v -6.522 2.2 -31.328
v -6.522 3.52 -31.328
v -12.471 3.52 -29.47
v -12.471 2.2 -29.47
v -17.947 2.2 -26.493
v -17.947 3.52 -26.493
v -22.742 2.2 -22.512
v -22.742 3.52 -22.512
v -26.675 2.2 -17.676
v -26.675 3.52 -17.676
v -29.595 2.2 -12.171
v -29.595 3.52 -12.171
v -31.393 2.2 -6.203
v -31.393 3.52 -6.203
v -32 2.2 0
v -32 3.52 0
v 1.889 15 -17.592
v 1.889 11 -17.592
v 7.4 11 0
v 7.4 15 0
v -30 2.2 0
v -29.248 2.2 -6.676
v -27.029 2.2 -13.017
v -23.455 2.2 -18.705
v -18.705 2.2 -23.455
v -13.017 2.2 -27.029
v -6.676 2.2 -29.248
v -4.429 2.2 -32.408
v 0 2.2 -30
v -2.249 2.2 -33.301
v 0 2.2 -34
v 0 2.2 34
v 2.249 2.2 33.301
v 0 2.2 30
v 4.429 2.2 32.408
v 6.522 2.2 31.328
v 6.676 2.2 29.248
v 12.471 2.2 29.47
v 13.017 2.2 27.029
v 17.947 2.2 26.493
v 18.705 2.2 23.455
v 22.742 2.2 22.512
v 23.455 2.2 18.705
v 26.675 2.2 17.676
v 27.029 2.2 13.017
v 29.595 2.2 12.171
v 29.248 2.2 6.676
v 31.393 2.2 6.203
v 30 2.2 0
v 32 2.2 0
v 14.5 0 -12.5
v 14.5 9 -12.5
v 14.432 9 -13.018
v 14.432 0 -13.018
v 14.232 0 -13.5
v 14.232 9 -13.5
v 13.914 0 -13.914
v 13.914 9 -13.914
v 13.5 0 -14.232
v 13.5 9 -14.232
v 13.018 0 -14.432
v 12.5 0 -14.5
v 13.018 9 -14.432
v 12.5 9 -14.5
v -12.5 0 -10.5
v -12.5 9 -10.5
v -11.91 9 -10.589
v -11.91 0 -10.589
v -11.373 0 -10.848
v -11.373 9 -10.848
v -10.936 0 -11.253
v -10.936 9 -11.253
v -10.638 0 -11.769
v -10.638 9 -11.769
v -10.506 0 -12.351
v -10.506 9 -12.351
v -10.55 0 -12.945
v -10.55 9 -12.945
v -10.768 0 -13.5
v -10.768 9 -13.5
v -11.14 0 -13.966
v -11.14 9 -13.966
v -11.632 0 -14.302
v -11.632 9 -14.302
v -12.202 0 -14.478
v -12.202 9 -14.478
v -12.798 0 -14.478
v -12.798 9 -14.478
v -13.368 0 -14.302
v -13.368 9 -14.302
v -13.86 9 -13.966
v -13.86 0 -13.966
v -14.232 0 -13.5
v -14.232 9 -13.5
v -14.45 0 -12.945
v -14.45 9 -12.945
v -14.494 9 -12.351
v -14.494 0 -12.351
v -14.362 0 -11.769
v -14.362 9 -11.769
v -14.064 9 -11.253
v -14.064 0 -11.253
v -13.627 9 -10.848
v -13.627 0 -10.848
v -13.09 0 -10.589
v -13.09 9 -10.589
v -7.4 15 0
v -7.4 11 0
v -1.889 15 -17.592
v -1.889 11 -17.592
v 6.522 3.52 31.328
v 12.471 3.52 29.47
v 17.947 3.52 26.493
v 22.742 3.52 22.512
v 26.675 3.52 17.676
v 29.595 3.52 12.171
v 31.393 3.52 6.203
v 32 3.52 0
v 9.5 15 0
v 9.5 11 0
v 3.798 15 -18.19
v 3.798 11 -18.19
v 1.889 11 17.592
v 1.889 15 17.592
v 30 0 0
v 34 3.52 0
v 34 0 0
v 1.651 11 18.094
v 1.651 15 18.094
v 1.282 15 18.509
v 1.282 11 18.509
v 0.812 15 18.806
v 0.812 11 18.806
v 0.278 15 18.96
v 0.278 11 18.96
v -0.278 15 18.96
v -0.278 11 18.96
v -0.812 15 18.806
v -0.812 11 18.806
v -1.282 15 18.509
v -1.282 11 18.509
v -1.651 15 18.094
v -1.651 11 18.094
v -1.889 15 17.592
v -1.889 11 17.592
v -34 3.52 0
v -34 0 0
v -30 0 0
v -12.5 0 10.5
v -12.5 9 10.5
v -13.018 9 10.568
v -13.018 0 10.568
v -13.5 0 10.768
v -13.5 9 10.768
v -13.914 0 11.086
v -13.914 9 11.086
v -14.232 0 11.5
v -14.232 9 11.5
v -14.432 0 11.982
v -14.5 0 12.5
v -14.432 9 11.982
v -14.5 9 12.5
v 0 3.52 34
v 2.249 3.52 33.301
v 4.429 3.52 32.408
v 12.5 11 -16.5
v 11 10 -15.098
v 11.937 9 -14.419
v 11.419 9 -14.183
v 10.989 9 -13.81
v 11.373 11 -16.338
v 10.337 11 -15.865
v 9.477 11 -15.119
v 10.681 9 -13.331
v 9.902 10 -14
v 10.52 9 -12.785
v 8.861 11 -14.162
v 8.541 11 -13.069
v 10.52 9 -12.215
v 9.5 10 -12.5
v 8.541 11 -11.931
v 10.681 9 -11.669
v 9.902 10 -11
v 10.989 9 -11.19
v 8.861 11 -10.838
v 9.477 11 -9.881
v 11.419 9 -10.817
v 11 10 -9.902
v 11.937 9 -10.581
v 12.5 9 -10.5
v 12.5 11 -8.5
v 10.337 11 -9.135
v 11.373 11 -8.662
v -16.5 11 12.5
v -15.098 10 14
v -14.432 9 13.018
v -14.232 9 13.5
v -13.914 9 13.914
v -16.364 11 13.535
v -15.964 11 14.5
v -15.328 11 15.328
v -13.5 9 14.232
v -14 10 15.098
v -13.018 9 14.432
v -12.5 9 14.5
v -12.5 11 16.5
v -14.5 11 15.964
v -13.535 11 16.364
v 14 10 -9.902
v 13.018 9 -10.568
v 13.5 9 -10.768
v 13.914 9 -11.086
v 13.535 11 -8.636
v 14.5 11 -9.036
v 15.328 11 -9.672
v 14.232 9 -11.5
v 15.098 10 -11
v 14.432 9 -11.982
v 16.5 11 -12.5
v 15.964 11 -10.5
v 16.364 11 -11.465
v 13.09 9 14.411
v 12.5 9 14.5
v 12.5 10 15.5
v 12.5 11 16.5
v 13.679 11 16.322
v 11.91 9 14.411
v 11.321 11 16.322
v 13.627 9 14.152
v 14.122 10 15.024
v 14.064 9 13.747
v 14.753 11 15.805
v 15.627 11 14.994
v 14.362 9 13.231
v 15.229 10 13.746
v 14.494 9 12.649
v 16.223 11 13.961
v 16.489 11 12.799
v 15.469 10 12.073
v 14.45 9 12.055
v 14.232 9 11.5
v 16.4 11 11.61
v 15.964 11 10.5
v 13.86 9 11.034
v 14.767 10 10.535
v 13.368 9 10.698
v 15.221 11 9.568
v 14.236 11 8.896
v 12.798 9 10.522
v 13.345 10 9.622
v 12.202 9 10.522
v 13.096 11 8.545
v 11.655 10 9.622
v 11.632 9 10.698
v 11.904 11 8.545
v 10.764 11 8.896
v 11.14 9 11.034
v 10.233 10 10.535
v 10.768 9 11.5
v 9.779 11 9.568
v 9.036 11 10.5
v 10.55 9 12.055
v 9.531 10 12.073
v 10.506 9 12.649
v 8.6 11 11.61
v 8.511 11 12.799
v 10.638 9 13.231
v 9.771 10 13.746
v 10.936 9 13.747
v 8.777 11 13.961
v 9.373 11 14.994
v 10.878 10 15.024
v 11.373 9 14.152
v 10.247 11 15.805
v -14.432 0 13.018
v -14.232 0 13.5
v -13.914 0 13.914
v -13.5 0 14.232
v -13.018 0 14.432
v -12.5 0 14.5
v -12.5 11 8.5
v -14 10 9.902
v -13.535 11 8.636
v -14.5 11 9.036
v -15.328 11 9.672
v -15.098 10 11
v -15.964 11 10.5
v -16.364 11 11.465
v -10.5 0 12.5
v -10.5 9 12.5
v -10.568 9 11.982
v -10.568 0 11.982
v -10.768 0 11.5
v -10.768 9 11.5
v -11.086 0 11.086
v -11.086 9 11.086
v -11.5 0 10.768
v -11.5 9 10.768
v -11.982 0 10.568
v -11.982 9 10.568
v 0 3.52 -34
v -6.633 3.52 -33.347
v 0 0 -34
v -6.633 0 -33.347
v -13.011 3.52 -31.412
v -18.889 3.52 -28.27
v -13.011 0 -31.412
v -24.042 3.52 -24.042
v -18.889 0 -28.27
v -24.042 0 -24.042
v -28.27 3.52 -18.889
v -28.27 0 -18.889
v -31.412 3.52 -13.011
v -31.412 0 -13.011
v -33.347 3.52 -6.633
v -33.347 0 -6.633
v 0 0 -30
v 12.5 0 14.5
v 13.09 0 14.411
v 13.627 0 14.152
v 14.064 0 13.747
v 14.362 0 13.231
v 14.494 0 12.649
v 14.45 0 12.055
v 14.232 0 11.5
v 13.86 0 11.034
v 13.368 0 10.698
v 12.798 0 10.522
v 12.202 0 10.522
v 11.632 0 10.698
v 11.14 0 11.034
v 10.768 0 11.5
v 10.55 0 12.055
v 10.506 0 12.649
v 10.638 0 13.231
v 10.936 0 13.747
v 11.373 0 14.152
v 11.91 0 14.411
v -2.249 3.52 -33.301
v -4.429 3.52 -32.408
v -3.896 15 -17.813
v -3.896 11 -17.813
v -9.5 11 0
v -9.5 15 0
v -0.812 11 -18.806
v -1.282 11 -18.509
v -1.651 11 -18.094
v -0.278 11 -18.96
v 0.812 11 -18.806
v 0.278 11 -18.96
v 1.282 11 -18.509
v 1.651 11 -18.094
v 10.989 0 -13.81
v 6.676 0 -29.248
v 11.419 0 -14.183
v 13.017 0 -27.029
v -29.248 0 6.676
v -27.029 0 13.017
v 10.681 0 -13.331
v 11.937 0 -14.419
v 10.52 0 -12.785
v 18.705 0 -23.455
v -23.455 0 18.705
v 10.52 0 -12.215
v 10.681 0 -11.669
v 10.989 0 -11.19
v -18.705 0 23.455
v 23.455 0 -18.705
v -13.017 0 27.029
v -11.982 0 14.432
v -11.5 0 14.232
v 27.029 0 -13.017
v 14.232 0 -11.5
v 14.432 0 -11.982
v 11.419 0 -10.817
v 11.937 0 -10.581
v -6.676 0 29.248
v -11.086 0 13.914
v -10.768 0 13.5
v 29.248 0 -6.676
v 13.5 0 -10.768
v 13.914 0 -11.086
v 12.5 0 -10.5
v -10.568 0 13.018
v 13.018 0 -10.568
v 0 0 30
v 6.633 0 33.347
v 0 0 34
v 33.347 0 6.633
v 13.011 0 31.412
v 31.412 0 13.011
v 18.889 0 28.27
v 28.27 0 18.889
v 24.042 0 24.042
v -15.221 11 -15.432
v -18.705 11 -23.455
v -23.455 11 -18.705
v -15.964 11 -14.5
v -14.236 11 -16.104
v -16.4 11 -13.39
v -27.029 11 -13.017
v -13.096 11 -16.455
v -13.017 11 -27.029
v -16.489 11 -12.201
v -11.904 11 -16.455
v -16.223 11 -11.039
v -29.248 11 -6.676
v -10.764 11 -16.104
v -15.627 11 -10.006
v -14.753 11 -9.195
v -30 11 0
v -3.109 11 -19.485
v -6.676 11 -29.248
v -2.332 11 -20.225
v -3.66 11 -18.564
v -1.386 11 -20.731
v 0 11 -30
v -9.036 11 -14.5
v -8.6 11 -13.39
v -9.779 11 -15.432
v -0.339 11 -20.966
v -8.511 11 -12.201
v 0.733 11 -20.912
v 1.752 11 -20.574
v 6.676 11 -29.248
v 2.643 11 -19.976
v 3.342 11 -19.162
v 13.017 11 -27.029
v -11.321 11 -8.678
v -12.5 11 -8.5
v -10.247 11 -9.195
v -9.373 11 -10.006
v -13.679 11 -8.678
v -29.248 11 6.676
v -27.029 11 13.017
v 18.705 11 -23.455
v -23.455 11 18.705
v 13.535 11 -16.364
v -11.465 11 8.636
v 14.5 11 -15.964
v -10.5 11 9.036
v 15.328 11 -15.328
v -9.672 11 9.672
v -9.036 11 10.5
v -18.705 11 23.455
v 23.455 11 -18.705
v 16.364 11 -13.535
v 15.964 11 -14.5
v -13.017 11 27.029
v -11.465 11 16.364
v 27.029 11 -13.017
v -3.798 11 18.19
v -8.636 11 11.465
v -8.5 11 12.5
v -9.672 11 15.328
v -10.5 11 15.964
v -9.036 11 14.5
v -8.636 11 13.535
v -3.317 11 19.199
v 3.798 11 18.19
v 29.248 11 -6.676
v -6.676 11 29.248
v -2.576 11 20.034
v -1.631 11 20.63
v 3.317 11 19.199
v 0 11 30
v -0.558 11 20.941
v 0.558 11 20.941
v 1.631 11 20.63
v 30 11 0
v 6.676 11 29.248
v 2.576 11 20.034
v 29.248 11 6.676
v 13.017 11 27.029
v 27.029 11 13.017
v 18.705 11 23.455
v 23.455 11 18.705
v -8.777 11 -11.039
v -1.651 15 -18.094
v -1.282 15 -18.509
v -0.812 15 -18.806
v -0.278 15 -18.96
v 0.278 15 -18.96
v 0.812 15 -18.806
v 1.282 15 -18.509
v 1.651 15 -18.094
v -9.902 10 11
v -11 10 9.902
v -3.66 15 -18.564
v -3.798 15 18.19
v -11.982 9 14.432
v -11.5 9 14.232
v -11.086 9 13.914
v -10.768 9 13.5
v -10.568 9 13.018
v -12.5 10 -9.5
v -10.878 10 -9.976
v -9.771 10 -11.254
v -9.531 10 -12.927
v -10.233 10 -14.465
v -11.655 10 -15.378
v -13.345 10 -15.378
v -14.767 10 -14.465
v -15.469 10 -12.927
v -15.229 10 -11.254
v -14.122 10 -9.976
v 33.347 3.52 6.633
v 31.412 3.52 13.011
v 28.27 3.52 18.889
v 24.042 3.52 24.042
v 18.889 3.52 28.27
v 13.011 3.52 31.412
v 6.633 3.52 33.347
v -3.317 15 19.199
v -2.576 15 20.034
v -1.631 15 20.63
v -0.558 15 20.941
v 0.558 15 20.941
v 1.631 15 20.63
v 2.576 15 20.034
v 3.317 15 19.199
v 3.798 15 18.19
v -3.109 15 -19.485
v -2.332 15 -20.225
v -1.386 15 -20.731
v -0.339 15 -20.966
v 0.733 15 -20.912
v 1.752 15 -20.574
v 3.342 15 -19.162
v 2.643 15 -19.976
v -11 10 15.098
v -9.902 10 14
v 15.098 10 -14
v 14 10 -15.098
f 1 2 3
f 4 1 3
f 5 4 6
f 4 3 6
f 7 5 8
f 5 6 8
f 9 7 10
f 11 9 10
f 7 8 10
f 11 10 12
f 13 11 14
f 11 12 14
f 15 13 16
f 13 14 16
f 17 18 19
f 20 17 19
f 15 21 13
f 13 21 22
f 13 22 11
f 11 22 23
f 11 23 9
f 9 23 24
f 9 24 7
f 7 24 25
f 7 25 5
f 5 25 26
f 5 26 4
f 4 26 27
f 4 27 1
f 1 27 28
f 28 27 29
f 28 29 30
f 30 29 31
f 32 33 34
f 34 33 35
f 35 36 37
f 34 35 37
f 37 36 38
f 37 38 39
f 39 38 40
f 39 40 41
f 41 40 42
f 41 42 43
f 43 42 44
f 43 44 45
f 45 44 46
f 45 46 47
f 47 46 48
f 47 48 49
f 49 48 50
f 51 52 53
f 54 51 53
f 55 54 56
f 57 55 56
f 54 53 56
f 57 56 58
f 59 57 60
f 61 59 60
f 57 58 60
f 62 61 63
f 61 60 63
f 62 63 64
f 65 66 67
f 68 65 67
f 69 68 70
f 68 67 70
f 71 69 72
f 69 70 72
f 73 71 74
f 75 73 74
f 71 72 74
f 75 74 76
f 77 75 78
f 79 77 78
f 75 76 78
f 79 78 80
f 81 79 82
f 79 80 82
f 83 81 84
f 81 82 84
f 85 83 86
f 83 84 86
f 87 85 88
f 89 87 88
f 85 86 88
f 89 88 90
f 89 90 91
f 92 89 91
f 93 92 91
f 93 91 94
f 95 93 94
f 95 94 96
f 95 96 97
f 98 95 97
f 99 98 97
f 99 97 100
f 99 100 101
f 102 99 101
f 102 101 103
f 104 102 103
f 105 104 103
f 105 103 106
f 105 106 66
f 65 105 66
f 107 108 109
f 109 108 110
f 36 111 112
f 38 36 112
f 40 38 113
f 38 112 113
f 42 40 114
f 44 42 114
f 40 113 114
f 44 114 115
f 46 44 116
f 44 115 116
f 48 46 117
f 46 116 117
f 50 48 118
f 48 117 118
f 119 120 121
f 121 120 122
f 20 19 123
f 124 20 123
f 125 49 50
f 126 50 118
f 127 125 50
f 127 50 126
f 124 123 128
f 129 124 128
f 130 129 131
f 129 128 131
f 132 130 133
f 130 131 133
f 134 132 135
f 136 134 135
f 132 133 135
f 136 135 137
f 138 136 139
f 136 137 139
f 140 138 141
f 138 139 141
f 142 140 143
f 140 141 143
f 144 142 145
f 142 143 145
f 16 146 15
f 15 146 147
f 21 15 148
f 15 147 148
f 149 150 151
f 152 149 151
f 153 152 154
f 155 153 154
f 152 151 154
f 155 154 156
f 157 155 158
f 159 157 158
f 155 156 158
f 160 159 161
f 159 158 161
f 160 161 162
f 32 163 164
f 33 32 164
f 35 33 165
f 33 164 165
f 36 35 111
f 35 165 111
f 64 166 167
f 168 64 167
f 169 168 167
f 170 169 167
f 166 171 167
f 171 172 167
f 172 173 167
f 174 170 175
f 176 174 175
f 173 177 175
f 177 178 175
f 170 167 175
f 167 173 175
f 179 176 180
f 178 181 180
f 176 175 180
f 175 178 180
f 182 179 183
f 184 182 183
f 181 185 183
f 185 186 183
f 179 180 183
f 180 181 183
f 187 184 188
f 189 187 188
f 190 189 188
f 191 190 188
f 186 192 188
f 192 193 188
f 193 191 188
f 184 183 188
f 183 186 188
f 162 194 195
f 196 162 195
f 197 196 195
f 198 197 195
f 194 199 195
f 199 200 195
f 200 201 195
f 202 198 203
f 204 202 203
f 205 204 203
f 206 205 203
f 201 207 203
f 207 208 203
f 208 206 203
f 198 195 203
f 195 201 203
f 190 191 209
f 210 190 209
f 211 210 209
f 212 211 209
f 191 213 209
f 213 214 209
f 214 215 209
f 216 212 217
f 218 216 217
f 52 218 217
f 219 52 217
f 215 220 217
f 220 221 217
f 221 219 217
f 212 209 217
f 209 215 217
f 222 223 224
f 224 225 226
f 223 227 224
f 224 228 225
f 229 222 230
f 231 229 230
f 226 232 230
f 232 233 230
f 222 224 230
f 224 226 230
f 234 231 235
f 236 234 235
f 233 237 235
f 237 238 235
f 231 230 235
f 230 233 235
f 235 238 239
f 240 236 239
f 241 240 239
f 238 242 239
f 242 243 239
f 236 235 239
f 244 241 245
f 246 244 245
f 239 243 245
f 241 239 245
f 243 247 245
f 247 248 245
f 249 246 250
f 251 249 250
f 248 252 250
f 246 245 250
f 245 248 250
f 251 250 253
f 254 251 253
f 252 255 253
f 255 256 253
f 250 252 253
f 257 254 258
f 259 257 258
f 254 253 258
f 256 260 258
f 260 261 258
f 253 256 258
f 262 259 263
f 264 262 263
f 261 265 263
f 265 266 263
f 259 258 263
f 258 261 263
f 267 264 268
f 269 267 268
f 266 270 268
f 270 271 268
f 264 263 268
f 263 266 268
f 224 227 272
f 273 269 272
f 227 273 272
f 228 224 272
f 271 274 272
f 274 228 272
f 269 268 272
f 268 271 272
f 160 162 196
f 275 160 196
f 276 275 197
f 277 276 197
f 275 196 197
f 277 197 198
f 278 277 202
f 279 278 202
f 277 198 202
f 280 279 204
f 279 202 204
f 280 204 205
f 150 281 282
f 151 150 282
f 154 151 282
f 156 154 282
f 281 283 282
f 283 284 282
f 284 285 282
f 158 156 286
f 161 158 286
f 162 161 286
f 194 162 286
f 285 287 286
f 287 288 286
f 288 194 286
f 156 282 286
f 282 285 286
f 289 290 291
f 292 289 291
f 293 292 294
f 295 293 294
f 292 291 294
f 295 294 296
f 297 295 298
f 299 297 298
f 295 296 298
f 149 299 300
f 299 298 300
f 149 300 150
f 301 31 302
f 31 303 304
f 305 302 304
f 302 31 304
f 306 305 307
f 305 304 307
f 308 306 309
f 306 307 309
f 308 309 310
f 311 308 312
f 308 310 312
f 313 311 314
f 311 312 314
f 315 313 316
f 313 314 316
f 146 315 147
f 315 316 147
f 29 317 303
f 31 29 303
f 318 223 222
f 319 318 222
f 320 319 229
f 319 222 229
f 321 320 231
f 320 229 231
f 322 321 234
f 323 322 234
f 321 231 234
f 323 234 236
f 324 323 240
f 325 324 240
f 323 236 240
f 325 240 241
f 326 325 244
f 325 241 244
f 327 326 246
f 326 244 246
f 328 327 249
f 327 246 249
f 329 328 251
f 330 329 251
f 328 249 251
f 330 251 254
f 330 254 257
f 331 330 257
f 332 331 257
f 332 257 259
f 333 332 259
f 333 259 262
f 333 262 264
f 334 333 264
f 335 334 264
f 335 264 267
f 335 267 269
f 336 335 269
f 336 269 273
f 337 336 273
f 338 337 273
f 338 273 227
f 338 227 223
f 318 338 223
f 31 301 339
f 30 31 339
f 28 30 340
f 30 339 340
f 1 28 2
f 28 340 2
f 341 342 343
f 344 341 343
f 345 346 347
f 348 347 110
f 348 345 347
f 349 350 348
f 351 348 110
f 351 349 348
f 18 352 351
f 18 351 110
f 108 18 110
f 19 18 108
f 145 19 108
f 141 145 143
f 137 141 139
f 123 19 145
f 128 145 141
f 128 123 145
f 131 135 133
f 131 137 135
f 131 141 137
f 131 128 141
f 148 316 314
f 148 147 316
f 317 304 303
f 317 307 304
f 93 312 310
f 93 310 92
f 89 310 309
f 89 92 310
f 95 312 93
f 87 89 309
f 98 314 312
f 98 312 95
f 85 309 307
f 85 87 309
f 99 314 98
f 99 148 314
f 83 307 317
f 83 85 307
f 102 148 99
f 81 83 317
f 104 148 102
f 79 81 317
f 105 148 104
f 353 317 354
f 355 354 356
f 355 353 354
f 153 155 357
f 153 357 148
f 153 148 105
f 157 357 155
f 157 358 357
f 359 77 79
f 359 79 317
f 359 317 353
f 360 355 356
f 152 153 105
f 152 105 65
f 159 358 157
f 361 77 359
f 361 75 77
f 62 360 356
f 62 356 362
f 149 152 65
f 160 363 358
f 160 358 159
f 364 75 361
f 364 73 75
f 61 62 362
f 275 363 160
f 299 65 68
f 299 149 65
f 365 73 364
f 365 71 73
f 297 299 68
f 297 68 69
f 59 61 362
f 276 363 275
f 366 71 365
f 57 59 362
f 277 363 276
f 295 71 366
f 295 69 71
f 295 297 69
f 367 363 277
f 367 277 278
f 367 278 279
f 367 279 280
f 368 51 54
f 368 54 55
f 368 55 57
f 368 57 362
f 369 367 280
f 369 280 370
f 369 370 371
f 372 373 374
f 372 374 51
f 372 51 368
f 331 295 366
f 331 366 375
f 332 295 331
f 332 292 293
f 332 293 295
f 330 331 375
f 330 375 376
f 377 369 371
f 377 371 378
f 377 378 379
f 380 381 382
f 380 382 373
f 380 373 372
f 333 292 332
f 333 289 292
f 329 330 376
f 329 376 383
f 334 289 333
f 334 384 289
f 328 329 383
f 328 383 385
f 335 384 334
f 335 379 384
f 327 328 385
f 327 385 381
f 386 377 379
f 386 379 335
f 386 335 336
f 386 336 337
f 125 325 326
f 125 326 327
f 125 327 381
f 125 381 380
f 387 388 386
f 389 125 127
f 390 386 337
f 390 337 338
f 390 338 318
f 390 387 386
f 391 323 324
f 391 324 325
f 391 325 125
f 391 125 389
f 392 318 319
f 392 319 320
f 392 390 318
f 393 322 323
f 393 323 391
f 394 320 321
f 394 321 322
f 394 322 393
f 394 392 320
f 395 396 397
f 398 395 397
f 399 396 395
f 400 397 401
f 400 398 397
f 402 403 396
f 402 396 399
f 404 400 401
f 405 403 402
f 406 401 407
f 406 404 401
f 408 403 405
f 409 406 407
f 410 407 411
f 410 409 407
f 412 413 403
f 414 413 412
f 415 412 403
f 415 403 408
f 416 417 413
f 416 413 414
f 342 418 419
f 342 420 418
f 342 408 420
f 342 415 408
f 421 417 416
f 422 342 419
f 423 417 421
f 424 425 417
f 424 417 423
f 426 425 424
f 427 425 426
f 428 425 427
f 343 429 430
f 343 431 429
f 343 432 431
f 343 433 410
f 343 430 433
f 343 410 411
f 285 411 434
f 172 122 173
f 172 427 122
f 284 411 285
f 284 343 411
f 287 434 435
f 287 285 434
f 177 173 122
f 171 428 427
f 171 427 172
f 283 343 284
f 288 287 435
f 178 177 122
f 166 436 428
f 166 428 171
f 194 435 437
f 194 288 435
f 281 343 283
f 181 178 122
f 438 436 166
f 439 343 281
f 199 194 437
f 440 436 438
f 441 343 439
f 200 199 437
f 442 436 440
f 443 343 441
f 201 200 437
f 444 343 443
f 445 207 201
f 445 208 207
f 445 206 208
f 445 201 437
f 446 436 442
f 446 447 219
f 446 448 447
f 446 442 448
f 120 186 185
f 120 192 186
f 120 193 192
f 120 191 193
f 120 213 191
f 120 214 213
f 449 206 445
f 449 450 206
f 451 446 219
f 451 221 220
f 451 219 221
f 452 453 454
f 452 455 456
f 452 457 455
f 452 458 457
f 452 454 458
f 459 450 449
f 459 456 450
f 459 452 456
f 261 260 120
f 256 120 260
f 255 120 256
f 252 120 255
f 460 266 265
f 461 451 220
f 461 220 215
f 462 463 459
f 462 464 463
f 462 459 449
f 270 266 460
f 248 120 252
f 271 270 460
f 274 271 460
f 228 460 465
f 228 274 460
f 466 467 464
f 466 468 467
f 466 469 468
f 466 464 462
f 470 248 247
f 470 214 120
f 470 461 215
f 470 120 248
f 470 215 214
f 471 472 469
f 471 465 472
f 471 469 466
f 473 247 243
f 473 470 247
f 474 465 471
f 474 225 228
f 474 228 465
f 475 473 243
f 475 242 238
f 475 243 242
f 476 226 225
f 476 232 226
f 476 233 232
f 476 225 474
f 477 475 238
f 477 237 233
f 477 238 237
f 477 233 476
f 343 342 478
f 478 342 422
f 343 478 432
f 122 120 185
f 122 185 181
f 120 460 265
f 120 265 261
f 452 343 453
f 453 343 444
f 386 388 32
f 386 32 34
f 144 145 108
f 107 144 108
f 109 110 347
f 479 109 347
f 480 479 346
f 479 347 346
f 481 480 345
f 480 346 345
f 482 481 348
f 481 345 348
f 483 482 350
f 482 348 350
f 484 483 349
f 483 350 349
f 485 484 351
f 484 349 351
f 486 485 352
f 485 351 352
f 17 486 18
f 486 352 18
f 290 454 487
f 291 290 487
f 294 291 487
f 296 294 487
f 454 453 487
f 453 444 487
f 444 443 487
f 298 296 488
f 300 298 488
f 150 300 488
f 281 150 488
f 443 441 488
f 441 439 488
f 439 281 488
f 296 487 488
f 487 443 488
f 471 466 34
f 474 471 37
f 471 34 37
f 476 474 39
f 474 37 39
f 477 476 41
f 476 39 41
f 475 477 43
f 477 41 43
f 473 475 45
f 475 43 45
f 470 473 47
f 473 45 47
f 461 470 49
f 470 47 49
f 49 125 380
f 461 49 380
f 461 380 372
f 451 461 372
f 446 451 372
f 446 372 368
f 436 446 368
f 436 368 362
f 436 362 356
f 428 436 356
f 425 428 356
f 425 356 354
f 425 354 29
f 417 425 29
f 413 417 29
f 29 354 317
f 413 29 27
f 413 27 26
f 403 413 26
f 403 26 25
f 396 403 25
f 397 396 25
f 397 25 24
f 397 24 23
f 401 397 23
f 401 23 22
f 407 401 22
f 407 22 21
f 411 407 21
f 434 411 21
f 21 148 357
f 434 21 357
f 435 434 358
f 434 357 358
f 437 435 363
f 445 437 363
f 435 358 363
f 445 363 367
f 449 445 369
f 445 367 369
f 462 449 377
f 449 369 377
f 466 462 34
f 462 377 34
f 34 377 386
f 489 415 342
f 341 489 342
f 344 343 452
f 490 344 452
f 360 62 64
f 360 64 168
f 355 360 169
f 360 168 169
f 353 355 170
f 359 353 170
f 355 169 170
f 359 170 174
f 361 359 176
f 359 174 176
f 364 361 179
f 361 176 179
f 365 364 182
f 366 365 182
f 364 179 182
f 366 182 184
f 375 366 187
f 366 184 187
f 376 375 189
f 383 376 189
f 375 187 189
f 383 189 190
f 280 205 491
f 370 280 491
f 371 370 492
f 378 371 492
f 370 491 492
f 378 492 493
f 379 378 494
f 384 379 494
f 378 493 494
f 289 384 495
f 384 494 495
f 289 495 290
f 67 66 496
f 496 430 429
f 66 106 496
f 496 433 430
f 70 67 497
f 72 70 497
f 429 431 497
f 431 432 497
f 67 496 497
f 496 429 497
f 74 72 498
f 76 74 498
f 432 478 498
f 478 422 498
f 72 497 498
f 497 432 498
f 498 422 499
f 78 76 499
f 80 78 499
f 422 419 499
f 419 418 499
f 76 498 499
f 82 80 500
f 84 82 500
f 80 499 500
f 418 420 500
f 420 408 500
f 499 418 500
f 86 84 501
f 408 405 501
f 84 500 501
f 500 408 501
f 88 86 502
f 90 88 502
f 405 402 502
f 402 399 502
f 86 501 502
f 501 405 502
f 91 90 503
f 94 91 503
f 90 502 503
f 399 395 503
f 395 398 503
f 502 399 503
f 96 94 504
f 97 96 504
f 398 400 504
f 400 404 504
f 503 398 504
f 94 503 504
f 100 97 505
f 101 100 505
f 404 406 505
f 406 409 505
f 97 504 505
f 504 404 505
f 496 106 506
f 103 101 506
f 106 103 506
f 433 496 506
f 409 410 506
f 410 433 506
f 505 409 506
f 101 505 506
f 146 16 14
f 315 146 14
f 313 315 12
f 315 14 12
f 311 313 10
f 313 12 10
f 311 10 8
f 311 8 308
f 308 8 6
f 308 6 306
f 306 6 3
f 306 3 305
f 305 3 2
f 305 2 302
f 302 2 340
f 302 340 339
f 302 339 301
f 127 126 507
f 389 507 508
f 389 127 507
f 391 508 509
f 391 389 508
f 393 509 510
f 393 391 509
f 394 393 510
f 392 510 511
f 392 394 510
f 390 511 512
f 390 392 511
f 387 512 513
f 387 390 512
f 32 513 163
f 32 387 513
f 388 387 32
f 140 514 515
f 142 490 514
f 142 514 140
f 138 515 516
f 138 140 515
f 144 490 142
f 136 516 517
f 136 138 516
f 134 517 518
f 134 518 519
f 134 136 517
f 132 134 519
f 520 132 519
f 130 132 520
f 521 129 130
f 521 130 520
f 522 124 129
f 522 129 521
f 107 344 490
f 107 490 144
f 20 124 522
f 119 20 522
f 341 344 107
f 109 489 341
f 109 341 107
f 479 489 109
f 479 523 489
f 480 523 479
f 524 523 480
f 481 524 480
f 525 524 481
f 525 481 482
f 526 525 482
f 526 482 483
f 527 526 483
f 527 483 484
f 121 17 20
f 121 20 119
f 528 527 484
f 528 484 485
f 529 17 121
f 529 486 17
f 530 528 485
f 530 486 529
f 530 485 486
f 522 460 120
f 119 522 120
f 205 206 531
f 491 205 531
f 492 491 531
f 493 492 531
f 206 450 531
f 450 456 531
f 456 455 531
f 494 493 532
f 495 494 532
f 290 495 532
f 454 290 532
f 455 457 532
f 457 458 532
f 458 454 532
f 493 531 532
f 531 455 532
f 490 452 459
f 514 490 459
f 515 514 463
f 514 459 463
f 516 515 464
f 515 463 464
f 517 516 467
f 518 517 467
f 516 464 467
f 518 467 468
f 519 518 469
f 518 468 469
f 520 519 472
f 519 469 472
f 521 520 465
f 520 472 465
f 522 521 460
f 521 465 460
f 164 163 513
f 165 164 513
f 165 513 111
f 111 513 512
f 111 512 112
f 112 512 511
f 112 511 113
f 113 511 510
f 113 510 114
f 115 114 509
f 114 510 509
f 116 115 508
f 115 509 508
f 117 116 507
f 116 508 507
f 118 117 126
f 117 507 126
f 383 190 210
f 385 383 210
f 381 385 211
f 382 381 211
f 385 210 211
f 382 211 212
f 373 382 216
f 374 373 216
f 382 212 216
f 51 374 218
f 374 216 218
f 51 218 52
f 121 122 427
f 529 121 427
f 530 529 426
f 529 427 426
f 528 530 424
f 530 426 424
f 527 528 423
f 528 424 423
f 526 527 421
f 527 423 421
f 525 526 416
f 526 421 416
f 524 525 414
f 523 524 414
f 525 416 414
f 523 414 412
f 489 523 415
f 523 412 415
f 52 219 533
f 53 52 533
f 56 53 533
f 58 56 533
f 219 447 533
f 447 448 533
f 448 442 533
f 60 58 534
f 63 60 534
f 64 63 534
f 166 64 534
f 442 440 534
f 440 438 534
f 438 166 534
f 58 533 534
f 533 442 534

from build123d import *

# Parameters (mm, degrees)
SKETCH_1_R          = 30
EXTRUDE_1_DEPTH     = 11
EXTRUDE_2_DEPTH     = 4
CUT_EXTRUDE_1_DEPTH = 1.32
SKETCH_8_R          = 2
CUT_EXTRUDE_2_DEPTH = 50.325449821
CHAMFER_2_SIZE      = 2
EXTRUDE_4_DEPTH     = 4


with BuildPart() as part:
    # 草图1 → 凸台-拉伸1 (new body)
    with BuildSketch(Plane(origin=(0, 0, 0), x_dir=(1, 0, 0), z_dir=(0, 1, 0))):
        with Locations(Location((0, 0, 0), (0, 0, 270))):
            Circle(SKETCH_1_R)
    extrude(amount=EXTRUDE_1_DEPTH)

    # 草图3 → 凸台-拉伸2 (add)
    with BuildSketch(Plane.XZ):
        with BuildLine():
            Line((-34, 0), (-30, 0))
            ThreePointArc((-30, 0), (-21.213203436, -21.213203436), (0, -30))
            Line((0, -30), (0, -34))
            ThreePointArc((0, -34), (-24.04163056, -24.04163056), (-34, 0))
        make_face()
        with BuildLine():
            Line((0, 34), (0, 30))
            ThreePointArc((0, 30), (21.213203436, 21.213203436), (30, 0))
            Line((30, 0), (34, 0))
            ThreePointArc((34, 0), (24.04163056, 24.04163056), (0, 34))
        make_face()
    extrude(amount=-EXTRUDE_2_DEPTH)

    # 草图6 → 切除-旋转8 (revolve, cut)
    with BuildSketch(Plane(origin=(0, 0, 0), x_dir=(-1, 0, 0), z_dir=(0, 0, -1)), mode=Mode.PRIVATE) as cut_revolve_8_sk:
        Polygon((-30, 2.2), (-32, 2.2), (-32, 3.52), (-34, 3.52), (-34, 4), (-30, 4), align=None)
    revolve(cut_revolve_8_sk.sketch.rotate(Axis((0, 0, 0), (0, 1, 0)), 270), axis=Axis((0, 0, 0), (0, 1, 0)), mode=Mode.SUBTRACT)

    # 草图7 → 切除-拉伸1 (cut)
    with BuildSketch(Plane(origin=(0, 3.52, 0), x_dir=(1, 0, 0), z_dir=(0, 1, 0))):
        with BuildLine():
            Line((6.522408084, -31.328233158), (-2.191886095, -31.444458777))
            Line((-2.191886095, -31.444458777), (0, -34))
            ThreePointArc((0, -34), (3.348762467, -32.877867185), (6.522408084, -31.328233158))
        make_face()
        with BuildLine():
            Line((-6.522408084, 31.328233158), (2.581044054, 31.031256101))
            Line((2.581044054, 31.031256101), (0, 34))
            ThreePointArc((0, 34), (-3.348762467, 32.877867185), (-6.522408084, 31.328233158))
        make_face()
    extrude(amount=-CUT_EXTRUDE_1_DEPTH, mode=Mode.SUBTRACT)

    # 草图8 → 切除-拉伸2 (cut, through all)
    with BuildSketch(Plane(origin=(0, 11, 0), x_dir=(1, 0, 0), z_dir=(0, 1, 0))):
        with BuildLine():
            ThreePointArc((14.5, 12.5), (13.914213562, 13.914213562), (12.5, 14.5))
            Line((12.5, 14.5), (12.5, 10.5))
            ThreePointArc((12.5, 10.5), (13.914213562, 11.085786438), (14.5, 12.5))
        make_face()
        with BuildLine():
            Line((12.5, 10.5), (12.5, 14.5))
            ThreePointArc((12.5, 14.5), (10.5, 12.5), (12.5, 10.5))
        make_face()
        with BuildLine():
            ThreePointArc((-12.5, -10.5), (-13.914213562, -11.085786438), (-14.5, -12.5))
            Line((-14.5, -12.5), (-12.5, -12.5))
            Line((-12.5, -12.5), (-12.5, -10.5))
        make_face()
        with BuildLine():
            Line((-12.5, -12.5), (-14.5, -12.5))
            ThreePointArc((-14.5, -12.5), (-13.914213562, -13.914213562), (-12.5, -14.5))
            Line((-12.5, -14.5), (-12.5, -12.5))
        make_face()
        with BuildLine():
            ThreePointArc((-10.5, -12.5), (-11.085786438, -11.085786438), (-12.5, -10.5))
            Line((-12.5, -10.5), (-12.5, -12.5))
            Line((-12.5, -12.5), (-10.5, -12.5))
        make_face()
        with BuildLine():
            Line((-10.5, -12.5), (-12.5, -12.5))
            Line((-12.5, -12.5), (-12.5, -14.5))
            ThreePointArc((-12.5, -14.5), (-11.085786438, -13.914213562), (-10.5, -12.5))
        make_face()
        with Locations(Location((12.5, -12.5, 0), (0, 0, 270))):
            Circle(SKETCH_8_R)
        with Locations(Location((-12.5, 12.5, 0), (0, 0, 270))):
            Circle(SKETCH_8_R)
    extrude(amount=-CUT_EXTRUDE_2_DEPTH, mode=Mode.SUBTRACT)

    # 倒角2
    chamfer_2_edges = [part.edges().sort_by_distance(p)[0] for p in [
        (-12.5, 11, -14.5),
        (12.5, 11, 10.5),
        (-12.5, 11, 10.5),
        (12.5, 11, -14.5),
    ]]
    chamfer(chamfer_2_edges, length=CHAMFER_2_SIZE)

    # 草图13 → 凸台-拉伸4 (add)
    with BuildSketch(Plane(origin=(0, 11, 0), x_dir=(1, 0, 0), z_dir=(0, 1, 0))):
        with BuildLine():
            Line((-3.896027989, 17.813244072), (-9.5, 0))
            Line((-9.5, 0), (-3.797777246, -18.190499049))
            ThreePointArc((-3.797777246, -18.190499049), (0, -20.98), (3.797777246, -18.190499049))
            Line((3.797777246, -18.190499049), (9.5, 0))
            Line((9.5, 0), (3.797777247, 18.190499048))
            ThreePointArc((3.797777247, 18.190499048), (0.198983725, 20.975022701), (-3.659900167, 18.563819291))
            Line((-3.659900167, 18.563819291), (-3.896027989, 17.813244072))
        make_face()
        with BuildLine():
            Line((-1.889470191, -17.591863495), (-7.4, 0))
            Line((-7.4, 0), (-1.889470192, 17.591863494))
            ThreePointArc((-1.889470192, 17.591863494), (0, 18.979999999), (1.889470191, 17.591863494))
            Line((1.889470191, 17.591863494), (7.4, 0))
            Line((7.4, 0), (1.889470191, -17.591863495))
            ThreePointArc((1.889470191, -17.591863495), (0, -18.98), (-1.889470191, -17.591863495))
        make_face(mode=Mode.SUBTRACT)
    extrude(amount=EXTRUDE_4_DEPTH)


solid = part.part
